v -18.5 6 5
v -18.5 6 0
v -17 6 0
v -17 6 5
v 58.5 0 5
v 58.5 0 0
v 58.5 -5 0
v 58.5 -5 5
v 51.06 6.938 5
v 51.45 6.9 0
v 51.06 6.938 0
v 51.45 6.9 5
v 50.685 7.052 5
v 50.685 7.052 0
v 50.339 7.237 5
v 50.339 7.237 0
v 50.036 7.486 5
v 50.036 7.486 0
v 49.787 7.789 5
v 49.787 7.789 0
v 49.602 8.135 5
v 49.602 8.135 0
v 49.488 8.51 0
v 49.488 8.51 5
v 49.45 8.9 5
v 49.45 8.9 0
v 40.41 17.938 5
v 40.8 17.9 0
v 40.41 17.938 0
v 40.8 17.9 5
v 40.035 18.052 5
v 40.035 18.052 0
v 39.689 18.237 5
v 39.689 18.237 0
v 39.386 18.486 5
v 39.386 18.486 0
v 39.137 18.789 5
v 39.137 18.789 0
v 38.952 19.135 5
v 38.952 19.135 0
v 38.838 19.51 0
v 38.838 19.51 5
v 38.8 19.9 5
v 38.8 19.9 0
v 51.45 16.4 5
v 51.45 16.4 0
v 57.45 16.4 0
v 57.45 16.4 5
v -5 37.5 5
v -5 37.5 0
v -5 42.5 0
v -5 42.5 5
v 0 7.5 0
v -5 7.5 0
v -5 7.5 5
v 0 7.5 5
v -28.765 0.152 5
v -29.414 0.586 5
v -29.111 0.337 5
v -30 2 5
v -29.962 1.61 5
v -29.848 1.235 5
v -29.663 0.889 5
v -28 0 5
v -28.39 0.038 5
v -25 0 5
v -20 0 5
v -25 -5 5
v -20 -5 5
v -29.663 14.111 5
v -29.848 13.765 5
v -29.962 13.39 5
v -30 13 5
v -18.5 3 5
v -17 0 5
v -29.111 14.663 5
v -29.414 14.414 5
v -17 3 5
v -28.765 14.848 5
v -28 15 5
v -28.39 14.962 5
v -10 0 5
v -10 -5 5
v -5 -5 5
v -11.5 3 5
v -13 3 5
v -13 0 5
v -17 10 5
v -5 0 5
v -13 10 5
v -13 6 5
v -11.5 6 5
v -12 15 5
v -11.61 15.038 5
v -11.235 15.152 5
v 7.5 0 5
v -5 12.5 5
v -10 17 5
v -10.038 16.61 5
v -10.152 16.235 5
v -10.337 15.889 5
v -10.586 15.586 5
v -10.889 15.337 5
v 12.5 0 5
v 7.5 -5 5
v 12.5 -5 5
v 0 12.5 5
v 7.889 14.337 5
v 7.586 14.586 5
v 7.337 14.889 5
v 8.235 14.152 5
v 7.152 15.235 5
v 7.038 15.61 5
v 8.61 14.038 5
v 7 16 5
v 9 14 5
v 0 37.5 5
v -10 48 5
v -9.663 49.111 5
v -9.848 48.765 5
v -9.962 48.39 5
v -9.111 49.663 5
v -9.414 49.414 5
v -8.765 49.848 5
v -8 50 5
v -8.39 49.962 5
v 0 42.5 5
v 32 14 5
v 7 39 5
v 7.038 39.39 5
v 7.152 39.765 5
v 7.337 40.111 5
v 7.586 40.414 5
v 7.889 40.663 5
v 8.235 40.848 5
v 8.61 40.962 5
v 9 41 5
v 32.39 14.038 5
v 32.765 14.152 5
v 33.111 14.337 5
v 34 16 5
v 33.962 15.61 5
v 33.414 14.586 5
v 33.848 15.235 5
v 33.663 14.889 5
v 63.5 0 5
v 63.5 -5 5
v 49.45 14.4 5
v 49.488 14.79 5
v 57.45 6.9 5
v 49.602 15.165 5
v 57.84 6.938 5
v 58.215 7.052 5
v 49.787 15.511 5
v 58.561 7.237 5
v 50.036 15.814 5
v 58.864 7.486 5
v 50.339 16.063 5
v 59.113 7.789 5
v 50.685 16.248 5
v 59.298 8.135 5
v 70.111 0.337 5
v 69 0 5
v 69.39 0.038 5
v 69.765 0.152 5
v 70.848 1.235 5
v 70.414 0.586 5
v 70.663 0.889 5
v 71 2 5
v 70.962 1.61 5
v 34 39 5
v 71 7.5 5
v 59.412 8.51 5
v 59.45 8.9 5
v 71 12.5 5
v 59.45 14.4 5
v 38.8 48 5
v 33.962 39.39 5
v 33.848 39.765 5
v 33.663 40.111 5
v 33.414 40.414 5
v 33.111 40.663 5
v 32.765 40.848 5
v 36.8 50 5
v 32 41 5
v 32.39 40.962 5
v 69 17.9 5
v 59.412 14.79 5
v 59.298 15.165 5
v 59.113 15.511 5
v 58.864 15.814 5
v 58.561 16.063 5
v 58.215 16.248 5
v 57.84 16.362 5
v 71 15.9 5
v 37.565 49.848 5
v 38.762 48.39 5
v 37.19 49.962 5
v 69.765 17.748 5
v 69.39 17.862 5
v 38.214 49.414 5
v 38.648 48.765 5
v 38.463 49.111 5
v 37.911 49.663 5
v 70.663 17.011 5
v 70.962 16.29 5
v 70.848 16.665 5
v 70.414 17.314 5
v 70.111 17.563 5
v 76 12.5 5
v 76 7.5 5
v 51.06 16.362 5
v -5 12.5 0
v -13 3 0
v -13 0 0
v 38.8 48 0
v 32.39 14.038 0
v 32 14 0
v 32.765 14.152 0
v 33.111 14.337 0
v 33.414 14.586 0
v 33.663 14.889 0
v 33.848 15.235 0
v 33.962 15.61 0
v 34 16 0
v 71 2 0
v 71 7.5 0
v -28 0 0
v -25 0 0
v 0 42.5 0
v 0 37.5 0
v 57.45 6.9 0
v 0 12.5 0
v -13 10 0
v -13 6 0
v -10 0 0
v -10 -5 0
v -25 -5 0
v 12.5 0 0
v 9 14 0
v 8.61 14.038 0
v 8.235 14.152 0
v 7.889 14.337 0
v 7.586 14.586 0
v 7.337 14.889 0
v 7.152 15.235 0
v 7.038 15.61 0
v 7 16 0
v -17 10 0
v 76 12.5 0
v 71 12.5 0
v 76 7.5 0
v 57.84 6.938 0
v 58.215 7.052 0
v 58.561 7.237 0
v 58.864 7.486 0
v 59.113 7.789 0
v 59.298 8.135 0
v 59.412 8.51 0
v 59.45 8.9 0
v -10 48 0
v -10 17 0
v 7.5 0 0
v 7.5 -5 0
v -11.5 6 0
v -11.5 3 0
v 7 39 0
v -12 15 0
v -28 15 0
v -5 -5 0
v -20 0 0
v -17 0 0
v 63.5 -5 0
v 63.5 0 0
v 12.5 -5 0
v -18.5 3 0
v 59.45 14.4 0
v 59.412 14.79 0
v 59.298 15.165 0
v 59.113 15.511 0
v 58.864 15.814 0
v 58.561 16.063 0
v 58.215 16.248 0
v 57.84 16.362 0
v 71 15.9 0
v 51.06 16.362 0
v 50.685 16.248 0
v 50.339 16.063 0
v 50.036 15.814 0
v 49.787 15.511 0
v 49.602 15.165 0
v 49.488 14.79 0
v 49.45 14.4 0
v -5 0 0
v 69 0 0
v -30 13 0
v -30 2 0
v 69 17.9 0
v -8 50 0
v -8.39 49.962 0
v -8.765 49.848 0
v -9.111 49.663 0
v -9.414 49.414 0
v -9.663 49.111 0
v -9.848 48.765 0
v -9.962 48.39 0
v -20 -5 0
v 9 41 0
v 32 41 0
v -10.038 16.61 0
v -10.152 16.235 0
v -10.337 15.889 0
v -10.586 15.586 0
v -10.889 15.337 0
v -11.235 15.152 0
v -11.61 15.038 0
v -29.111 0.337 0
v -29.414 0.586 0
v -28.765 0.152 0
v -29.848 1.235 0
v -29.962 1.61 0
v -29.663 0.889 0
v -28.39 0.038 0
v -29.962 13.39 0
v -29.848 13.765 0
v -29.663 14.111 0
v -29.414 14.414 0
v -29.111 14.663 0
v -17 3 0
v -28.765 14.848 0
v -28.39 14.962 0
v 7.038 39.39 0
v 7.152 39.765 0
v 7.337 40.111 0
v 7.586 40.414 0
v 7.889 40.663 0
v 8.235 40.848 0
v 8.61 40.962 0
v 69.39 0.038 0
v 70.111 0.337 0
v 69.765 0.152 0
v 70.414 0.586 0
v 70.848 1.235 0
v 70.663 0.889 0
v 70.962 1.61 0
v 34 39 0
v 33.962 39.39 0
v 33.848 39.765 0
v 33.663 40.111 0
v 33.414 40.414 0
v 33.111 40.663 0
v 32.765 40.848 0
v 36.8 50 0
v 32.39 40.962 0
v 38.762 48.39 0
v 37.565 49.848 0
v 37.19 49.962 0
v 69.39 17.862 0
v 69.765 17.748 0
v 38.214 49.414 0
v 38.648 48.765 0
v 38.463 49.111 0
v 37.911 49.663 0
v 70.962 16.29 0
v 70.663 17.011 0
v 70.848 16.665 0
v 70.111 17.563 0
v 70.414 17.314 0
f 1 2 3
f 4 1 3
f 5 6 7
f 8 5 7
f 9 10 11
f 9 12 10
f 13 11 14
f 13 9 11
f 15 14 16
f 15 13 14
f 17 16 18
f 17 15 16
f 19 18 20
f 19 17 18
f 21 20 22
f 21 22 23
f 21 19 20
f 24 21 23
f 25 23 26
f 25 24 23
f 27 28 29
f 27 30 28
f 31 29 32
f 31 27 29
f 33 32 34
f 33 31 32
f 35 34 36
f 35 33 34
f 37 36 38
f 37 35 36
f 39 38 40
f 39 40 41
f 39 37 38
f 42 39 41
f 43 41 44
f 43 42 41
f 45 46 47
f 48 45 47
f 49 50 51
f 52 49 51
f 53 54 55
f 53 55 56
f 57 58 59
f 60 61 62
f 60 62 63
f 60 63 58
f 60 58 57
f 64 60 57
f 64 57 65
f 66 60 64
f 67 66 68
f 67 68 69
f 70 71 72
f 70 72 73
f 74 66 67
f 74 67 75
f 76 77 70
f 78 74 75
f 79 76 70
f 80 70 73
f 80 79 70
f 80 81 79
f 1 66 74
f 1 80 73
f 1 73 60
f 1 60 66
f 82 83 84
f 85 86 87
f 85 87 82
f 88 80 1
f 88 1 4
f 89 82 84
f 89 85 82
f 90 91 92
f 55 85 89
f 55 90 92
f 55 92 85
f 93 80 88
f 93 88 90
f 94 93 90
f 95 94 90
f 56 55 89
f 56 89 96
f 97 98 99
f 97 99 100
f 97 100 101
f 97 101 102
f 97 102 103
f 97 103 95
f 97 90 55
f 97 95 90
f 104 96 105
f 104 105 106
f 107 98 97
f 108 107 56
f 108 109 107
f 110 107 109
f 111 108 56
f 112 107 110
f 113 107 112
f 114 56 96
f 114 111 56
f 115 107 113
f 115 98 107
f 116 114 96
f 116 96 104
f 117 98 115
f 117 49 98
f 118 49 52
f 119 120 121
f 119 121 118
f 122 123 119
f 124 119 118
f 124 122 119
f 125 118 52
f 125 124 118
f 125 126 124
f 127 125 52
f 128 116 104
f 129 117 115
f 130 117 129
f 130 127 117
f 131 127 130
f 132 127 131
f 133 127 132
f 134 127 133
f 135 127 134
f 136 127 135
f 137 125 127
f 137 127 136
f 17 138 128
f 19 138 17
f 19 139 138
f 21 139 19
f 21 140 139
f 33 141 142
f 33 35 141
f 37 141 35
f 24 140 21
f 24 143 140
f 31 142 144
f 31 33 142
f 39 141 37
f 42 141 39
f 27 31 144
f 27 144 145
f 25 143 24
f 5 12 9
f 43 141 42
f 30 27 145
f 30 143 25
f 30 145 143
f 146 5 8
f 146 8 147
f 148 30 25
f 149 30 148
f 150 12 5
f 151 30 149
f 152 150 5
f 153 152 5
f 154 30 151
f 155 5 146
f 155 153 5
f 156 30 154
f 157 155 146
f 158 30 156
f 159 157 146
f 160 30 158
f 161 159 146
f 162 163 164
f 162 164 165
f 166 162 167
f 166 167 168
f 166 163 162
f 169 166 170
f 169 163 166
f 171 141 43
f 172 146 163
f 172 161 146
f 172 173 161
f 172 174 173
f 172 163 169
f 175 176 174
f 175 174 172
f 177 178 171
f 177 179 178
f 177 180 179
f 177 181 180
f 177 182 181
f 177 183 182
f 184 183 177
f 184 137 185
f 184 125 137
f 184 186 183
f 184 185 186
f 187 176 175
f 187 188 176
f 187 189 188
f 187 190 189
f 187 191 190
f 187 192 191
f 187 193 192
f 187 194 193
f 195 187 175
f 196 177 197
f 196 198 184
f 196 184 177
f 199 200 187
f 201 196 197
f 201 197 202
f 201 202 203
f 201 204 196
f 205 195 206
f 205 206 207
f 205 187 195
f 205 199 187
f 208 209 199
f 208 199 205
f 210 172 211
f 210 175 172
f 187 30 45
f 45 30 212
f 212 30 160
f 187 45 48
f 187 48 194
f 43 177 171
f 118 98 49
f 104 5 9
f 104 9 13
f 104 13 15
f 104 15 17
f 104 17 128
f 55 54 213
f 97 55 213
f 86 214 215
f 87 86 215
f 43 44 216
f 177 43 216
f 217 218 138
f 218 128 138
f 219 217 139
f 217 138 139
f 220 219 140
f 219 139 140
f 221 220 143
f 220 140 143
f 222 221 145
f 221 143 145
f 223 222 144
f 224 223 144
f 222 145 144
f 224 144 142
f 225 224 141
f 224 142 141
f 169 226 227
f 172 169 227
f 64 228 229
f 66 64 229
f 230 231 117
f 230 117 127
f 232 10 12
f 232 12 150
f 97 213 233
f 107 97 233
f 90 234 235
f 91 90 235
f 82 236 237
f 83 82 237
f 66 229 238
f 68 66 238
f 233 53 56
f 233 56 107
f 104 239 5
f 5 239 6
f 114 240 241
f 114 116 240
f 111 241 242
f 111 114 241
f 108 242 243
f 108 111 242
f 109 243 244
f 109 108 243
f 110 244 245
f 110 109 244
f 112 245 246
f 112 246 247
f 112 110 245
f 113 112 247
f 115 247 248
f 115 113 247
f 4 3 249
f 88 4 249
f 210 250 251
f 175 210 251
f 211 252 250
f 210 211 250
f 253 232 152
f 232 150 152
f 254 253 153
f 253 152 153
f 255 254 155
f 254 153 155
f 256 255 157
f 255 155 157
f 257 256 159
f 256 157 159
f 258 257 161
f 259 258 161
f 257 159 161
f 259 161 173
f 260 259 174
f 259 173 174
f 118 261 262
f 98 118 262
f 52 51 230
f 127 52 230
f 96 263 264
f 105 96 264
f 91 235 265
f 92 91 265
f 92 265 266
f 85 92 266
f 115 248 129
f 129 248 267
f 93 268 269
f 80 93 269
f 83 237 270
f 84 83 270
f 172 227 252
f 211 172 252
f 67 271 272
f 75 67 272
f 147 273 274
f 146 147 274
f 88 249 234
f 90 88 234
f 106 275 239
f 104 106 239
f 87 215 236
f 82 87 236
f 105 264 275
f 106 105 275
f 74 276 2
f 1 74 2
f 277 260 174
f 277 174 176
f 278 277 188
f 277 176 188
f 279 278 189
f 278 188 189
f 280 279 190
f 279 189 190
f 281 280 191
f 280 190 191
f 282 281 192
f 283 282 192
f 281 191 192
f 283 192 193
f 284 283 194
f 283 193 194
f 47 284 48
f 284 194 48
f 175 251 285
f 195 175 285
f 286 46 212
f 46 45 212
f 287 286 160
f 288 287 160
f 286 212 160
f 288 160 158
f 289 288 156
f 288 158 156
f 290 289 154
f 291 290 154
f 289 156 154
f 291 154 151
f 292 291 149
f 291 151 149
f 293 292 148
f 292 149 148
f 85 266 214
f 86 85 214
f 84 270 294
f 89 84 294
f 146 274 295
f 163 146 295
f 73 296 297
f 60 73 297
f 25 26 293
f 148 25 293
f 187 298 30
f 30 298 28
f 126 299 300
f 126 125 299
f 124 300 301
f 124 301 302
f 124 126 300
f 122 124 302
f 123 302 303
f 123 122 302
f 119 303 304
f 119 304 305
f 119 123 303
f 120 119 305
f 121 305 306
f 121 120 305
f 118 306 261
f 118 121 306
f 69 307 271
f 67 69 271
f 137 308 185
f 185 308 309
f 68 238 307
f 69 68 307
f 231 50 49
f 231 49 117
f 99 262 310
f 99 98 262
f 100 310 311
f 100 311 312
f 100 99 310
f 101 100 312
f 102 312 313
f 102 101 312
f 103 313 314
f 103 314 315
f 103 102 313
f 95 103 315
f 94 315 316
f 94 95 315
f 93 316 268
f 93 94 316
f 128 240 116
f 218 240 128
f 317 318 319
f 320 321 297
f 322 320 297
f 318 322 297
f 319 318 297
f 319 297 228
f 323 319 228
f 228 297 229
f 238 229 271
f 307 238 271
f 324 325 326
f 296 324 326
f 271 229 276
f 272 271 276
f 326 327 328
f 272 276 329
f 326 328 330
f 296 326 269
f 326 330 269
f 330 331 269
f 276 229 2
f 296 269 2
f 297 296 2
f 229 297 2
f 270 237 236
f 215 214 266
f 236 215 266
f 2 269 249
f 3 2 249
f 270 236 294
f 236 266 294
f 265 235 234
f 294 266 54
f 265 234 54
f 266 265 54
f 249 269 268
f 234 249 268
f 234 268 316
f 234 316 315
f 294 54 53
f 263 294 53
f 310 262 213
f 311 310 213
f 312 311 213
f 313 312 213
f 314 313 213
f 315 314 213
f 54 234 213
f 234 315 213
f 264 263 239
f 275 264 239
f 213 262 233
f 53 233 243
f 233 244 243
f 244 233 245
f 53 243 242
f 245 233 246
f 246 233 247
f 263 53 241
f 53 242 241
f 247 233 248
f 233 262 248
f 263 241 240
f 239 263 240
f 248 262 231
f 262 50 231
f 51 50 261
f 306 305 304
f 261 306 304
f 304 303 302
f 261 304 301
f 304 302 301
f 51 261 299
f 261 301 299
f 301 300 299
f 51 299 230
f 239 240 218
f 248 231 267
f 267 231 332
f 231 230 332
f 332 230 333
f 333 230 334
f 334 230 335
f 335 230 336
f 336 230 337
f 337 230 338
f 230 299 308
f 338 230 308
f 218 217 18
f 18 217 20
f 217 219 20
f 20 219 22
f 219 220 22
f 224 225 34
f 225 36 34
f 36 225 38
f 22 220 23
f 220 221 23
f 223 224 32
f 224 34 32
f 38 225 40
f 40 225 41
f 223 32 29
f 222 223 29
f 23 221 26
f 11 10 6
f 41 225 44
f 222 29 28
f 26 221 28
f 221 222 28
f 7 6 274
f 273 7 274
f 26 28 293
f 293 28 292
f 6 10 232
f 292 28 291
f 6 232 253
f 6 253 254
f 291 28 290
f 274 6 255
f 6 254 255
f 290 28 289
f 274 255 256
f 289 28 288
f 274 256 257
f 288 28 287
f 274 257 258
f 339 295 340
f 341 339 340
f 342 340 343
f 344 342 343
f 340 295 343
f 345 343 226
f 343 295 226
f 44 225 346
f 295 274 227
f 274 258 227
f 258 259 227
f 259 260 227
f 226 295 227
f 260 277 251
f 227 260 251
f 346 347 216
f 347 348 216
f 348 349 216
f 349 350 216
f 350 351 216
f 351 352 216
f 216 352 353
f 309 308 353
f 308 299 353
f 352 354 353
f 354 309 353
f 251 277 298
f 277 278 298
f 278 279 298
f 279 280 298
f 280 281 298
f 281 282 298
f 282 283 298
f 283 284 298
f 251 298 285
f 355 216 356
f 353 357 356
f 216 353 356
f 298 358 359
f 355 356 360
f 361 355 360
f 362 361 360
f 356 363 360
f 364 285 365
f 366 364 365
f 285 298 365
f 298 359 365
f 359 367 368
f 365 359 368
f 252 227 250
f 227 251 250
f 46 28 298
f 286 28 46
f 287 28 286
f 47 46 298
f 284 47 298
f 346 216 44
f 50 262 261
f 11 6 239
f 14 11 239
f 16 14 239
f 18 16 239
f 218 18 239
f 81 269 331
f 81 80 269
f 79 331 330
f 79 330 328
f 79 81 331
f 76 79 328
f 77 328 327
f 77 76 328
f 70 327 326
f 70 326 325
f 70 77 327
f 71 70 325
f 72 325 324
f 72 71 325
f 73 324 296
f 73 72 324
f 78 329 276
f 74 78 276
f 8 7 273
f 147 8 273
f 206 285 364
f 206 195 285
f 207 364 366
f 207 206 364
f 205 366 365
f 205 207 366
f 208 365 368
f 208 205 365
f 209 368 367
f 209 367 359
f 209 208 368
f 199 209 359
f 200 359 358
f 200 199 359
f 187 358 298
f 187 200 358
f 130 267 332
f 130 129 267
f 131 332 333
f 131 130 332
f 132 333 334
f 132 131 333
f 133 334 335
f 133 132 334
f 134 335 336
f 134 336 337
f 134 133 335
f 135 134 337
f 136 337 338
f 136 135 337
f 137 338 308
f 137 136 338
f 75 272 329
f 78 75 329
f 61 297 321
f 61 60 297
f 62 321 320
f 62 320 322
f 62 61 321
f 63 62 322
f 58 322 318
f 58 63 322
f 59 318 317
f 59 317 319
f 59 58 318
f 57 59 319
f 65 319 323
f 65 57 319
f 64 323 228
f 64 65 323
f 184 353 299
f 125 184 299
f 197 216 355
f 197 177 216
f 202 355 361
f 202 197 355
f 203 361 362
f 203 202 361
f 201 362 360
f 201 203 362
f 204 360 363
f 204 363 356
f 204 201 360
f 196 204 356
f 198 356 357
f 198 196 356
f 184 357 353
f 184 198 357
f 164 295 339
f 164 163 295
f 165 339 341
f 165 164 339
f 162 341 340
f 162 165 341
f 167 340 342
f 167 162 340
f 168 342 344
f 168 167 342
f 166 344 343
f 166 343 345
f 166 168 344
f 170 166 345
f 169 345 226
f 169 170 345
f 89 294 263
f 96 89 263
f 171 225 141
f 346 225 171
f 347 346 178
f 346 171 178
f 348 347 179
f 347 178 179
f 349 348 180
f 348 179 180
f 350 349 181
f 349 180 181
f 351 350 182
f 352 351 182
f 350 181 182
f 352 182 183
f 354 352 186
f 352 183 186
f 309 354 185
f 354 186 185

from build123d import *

# Parameters (mm, degrees)
ESQUISSE1_W        = 27
ESQUISSE1_H        = 27
ESQUISSE1_W_2      = 5
ESQUISSE1_H_2      = 5
ESQUISSE1_W_3      = 10
ESQUISSE1_H_3      = 9.5
BOSS_EXTRU_1_DEPTH = 5
CONG_1_R           = 2


with BuildPart() as part:
    # Esquisse1 → Boss.-Extru.1 (new body)
    with BuildSketch(Plane.XY):
        Polygon((0, 0), (7.5, 0), (7.5, -5), (12.5, -5), (12.5, 0), (58.5, 0), (58.5, -5), (63.5, -5), (63.5, 0), (71, 0), (71, 7.5), (76, 7.5), (76, 12.5), (71, 12.5), (71, 17.9), (38.8, 17.9), (38.8, 50), (-10, 50), (-10, 15), (-30, 15), (-30, 0), (-25, 0), (-25, -5), (-20, -5), (-20, 0), (-17, 0), (-17, 3), (-18.5, 3), (-18.5, 6), (-17, 6), (-17, 10), (-13, 10), (-13, 6), (-11.5, 6), (-11.5, 3), (-13, 3), (-13, 0), (-10, 0), (-10, -5), (-5, -5), (-5, 0), align=None)
        with Locations((20.5, 27.5)):
            Rectangle(ESQUISSE1_W, ESQUISSE1_H, mode=Mode.SUBTRACT)
        with Locations((-2.5, 40)):
            Rectangle(ESQUISSE1_W_2, ESQUISSE1_H_2, mode=Mode.SUBTRACT)
        with Locations((-2.5, 10)):
            Rectangle(ESQUISSE1_W_2, ESQUISSE1_H_2, mode=Mode.SUBTRACT)
        with Locations((54.45, 11.65)):
            Rectangle(ESQUISSE1_W_3, ESQUISSE1_H_3, mode=Mode.SUBTRACT)
    extrude(amount=BOSS_EXTRU_1_DEPTH)

    # Congé1
    cong_1_edges = [part.edges().sort_by_distance(p)[0] for p in [
        (7, 41, 2.5),
        (7, 14, 2.5),
        (34, 14, 2.5),
        (34, 41, 2.5),
        (49.45, 16.4, 2.5),
        (49.45, 6.9, 2.5),
        (59.45, 6.9, 2.5),
        (59.45, 16.4, 2.5),
        (-30, 0, 2.5),
        (-30, 15, 2.5),
        (-10, 15, 2.5),
        (-10, 50, 2.5),
        (38.8, 50, 2.5),
        (38.8, 17.9, 2.5),
        (71, 17.9, 2.5),
        (71, 0, 2.5),
    ]]
    fillet(cong_1_edges, radius=CONG_1_R)


solid = part.part
